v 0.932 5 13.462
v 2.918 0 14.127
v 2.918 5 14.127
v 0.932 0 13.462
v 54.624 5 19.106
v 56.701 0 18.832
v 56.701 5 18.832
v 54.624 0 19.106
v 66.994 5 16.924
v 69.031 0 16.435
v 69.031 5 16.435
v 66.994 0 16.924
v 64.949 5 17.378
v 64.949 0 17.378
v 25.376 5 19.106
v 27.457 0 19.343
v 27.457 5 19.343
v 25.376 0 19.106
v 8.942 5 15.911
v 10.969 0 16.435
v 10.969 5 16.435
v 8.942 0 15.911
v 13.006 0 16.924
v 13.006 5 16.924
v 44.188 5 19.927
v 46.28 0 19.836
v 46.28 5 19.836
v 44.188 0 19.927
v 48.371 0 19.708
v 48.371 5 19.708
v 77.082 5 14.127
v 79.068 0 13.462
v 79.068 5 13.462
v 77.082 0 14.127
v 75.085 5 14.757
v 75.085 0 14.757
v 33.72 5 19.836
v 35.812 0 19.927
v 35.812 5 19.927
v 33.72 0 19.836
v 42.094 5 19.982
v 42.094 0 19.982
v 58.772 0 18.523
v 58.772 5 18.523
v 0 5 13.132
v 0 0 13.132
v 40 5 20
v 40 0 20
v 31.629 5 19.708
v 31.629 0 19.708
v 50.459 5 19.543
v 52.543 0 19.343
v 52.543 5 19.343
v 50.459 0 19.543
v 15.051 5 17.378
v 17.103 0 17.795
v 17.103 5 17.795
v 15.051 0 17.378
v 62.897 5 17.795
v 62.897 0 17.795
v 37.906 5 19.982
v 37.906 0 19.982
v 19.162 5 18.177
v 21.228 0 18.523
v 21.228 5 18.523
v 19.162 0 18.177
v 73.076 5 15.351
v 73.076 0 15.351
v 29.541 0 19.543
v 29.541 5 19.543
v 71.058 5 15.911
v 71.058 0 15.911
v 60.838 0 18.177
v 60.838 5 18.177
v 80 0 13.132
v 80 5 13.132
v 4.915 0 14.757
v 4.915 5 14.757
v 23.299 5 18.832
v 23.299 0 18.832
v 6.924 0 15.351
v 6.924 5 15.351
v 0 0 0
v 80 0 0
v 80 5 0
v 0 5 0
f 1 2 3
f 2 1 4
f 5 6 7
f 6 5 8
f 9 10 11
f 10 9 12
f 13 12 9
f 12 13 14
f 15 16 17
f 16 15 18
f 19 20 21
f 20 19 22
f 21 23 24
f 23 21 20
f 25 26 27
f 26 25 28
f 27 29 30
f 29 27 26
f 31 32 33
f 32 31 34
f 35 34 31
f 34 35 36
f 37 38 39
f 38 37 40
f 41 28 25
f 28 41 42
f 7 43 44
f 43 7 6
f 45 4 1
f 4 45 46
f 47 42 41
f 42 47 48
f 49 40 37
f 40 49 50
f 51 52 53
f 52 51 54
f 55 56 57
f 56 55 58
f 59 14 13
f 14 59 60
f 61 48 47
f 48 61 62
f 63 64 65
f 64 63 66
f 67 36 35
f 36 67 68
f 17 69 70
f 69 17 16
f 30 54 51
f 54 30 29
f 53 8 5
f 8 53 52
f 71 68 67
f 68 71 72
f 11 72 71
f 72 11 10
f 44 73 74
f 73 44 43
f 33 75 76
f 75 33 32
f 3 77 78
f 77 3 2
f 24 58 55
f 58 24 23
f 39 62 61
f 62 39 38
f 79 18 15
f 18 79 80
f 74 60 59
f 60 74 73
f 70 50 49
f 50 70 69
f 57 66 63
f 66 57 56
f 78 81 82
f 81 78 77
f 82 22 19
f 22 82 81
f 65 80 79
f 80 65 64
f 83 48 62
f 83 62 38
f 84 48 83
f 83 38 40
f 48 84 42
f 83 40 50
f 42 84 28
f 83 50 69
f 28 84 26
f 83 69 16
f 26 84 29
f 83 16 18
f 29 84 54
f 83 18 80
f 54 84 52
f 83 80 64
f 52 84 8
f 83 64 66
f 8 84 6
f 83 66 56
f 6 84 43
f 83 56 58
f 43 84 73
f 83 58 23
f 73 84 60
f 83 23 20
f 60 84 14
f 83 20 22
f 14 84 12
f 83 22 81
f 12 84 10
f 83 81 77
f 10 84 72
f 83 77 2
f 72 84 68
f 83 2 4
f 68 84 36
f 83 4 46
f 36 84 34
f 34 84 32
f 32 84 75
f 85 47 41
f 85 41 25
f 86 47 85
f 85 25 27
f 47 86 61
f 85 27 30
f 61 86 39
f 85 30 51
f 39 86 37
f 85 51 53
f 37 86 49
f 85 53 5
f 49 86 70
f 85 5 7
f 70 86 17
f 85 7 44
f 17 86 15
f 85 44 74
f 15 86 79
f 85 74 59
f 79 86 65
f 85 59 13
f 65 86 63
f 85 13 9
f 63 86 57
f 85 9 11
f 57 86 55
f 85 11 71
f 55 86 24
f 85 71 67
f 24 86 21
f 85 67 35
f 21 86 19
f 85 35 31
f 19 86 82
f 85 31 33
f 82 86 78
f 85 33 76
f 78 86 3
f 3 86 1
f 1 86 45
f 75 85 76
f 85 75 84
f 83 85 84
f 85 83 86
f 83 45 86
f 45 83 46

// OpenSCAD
$fs = 0.2;
$fa = 1;

intersection() {
	translate([40, 0, -100]) {
		rotate([-90, 0, 0]) {
			cylinder(r=120, h=5);
		}
	}
	cube([80, 5, 1000]);
}
